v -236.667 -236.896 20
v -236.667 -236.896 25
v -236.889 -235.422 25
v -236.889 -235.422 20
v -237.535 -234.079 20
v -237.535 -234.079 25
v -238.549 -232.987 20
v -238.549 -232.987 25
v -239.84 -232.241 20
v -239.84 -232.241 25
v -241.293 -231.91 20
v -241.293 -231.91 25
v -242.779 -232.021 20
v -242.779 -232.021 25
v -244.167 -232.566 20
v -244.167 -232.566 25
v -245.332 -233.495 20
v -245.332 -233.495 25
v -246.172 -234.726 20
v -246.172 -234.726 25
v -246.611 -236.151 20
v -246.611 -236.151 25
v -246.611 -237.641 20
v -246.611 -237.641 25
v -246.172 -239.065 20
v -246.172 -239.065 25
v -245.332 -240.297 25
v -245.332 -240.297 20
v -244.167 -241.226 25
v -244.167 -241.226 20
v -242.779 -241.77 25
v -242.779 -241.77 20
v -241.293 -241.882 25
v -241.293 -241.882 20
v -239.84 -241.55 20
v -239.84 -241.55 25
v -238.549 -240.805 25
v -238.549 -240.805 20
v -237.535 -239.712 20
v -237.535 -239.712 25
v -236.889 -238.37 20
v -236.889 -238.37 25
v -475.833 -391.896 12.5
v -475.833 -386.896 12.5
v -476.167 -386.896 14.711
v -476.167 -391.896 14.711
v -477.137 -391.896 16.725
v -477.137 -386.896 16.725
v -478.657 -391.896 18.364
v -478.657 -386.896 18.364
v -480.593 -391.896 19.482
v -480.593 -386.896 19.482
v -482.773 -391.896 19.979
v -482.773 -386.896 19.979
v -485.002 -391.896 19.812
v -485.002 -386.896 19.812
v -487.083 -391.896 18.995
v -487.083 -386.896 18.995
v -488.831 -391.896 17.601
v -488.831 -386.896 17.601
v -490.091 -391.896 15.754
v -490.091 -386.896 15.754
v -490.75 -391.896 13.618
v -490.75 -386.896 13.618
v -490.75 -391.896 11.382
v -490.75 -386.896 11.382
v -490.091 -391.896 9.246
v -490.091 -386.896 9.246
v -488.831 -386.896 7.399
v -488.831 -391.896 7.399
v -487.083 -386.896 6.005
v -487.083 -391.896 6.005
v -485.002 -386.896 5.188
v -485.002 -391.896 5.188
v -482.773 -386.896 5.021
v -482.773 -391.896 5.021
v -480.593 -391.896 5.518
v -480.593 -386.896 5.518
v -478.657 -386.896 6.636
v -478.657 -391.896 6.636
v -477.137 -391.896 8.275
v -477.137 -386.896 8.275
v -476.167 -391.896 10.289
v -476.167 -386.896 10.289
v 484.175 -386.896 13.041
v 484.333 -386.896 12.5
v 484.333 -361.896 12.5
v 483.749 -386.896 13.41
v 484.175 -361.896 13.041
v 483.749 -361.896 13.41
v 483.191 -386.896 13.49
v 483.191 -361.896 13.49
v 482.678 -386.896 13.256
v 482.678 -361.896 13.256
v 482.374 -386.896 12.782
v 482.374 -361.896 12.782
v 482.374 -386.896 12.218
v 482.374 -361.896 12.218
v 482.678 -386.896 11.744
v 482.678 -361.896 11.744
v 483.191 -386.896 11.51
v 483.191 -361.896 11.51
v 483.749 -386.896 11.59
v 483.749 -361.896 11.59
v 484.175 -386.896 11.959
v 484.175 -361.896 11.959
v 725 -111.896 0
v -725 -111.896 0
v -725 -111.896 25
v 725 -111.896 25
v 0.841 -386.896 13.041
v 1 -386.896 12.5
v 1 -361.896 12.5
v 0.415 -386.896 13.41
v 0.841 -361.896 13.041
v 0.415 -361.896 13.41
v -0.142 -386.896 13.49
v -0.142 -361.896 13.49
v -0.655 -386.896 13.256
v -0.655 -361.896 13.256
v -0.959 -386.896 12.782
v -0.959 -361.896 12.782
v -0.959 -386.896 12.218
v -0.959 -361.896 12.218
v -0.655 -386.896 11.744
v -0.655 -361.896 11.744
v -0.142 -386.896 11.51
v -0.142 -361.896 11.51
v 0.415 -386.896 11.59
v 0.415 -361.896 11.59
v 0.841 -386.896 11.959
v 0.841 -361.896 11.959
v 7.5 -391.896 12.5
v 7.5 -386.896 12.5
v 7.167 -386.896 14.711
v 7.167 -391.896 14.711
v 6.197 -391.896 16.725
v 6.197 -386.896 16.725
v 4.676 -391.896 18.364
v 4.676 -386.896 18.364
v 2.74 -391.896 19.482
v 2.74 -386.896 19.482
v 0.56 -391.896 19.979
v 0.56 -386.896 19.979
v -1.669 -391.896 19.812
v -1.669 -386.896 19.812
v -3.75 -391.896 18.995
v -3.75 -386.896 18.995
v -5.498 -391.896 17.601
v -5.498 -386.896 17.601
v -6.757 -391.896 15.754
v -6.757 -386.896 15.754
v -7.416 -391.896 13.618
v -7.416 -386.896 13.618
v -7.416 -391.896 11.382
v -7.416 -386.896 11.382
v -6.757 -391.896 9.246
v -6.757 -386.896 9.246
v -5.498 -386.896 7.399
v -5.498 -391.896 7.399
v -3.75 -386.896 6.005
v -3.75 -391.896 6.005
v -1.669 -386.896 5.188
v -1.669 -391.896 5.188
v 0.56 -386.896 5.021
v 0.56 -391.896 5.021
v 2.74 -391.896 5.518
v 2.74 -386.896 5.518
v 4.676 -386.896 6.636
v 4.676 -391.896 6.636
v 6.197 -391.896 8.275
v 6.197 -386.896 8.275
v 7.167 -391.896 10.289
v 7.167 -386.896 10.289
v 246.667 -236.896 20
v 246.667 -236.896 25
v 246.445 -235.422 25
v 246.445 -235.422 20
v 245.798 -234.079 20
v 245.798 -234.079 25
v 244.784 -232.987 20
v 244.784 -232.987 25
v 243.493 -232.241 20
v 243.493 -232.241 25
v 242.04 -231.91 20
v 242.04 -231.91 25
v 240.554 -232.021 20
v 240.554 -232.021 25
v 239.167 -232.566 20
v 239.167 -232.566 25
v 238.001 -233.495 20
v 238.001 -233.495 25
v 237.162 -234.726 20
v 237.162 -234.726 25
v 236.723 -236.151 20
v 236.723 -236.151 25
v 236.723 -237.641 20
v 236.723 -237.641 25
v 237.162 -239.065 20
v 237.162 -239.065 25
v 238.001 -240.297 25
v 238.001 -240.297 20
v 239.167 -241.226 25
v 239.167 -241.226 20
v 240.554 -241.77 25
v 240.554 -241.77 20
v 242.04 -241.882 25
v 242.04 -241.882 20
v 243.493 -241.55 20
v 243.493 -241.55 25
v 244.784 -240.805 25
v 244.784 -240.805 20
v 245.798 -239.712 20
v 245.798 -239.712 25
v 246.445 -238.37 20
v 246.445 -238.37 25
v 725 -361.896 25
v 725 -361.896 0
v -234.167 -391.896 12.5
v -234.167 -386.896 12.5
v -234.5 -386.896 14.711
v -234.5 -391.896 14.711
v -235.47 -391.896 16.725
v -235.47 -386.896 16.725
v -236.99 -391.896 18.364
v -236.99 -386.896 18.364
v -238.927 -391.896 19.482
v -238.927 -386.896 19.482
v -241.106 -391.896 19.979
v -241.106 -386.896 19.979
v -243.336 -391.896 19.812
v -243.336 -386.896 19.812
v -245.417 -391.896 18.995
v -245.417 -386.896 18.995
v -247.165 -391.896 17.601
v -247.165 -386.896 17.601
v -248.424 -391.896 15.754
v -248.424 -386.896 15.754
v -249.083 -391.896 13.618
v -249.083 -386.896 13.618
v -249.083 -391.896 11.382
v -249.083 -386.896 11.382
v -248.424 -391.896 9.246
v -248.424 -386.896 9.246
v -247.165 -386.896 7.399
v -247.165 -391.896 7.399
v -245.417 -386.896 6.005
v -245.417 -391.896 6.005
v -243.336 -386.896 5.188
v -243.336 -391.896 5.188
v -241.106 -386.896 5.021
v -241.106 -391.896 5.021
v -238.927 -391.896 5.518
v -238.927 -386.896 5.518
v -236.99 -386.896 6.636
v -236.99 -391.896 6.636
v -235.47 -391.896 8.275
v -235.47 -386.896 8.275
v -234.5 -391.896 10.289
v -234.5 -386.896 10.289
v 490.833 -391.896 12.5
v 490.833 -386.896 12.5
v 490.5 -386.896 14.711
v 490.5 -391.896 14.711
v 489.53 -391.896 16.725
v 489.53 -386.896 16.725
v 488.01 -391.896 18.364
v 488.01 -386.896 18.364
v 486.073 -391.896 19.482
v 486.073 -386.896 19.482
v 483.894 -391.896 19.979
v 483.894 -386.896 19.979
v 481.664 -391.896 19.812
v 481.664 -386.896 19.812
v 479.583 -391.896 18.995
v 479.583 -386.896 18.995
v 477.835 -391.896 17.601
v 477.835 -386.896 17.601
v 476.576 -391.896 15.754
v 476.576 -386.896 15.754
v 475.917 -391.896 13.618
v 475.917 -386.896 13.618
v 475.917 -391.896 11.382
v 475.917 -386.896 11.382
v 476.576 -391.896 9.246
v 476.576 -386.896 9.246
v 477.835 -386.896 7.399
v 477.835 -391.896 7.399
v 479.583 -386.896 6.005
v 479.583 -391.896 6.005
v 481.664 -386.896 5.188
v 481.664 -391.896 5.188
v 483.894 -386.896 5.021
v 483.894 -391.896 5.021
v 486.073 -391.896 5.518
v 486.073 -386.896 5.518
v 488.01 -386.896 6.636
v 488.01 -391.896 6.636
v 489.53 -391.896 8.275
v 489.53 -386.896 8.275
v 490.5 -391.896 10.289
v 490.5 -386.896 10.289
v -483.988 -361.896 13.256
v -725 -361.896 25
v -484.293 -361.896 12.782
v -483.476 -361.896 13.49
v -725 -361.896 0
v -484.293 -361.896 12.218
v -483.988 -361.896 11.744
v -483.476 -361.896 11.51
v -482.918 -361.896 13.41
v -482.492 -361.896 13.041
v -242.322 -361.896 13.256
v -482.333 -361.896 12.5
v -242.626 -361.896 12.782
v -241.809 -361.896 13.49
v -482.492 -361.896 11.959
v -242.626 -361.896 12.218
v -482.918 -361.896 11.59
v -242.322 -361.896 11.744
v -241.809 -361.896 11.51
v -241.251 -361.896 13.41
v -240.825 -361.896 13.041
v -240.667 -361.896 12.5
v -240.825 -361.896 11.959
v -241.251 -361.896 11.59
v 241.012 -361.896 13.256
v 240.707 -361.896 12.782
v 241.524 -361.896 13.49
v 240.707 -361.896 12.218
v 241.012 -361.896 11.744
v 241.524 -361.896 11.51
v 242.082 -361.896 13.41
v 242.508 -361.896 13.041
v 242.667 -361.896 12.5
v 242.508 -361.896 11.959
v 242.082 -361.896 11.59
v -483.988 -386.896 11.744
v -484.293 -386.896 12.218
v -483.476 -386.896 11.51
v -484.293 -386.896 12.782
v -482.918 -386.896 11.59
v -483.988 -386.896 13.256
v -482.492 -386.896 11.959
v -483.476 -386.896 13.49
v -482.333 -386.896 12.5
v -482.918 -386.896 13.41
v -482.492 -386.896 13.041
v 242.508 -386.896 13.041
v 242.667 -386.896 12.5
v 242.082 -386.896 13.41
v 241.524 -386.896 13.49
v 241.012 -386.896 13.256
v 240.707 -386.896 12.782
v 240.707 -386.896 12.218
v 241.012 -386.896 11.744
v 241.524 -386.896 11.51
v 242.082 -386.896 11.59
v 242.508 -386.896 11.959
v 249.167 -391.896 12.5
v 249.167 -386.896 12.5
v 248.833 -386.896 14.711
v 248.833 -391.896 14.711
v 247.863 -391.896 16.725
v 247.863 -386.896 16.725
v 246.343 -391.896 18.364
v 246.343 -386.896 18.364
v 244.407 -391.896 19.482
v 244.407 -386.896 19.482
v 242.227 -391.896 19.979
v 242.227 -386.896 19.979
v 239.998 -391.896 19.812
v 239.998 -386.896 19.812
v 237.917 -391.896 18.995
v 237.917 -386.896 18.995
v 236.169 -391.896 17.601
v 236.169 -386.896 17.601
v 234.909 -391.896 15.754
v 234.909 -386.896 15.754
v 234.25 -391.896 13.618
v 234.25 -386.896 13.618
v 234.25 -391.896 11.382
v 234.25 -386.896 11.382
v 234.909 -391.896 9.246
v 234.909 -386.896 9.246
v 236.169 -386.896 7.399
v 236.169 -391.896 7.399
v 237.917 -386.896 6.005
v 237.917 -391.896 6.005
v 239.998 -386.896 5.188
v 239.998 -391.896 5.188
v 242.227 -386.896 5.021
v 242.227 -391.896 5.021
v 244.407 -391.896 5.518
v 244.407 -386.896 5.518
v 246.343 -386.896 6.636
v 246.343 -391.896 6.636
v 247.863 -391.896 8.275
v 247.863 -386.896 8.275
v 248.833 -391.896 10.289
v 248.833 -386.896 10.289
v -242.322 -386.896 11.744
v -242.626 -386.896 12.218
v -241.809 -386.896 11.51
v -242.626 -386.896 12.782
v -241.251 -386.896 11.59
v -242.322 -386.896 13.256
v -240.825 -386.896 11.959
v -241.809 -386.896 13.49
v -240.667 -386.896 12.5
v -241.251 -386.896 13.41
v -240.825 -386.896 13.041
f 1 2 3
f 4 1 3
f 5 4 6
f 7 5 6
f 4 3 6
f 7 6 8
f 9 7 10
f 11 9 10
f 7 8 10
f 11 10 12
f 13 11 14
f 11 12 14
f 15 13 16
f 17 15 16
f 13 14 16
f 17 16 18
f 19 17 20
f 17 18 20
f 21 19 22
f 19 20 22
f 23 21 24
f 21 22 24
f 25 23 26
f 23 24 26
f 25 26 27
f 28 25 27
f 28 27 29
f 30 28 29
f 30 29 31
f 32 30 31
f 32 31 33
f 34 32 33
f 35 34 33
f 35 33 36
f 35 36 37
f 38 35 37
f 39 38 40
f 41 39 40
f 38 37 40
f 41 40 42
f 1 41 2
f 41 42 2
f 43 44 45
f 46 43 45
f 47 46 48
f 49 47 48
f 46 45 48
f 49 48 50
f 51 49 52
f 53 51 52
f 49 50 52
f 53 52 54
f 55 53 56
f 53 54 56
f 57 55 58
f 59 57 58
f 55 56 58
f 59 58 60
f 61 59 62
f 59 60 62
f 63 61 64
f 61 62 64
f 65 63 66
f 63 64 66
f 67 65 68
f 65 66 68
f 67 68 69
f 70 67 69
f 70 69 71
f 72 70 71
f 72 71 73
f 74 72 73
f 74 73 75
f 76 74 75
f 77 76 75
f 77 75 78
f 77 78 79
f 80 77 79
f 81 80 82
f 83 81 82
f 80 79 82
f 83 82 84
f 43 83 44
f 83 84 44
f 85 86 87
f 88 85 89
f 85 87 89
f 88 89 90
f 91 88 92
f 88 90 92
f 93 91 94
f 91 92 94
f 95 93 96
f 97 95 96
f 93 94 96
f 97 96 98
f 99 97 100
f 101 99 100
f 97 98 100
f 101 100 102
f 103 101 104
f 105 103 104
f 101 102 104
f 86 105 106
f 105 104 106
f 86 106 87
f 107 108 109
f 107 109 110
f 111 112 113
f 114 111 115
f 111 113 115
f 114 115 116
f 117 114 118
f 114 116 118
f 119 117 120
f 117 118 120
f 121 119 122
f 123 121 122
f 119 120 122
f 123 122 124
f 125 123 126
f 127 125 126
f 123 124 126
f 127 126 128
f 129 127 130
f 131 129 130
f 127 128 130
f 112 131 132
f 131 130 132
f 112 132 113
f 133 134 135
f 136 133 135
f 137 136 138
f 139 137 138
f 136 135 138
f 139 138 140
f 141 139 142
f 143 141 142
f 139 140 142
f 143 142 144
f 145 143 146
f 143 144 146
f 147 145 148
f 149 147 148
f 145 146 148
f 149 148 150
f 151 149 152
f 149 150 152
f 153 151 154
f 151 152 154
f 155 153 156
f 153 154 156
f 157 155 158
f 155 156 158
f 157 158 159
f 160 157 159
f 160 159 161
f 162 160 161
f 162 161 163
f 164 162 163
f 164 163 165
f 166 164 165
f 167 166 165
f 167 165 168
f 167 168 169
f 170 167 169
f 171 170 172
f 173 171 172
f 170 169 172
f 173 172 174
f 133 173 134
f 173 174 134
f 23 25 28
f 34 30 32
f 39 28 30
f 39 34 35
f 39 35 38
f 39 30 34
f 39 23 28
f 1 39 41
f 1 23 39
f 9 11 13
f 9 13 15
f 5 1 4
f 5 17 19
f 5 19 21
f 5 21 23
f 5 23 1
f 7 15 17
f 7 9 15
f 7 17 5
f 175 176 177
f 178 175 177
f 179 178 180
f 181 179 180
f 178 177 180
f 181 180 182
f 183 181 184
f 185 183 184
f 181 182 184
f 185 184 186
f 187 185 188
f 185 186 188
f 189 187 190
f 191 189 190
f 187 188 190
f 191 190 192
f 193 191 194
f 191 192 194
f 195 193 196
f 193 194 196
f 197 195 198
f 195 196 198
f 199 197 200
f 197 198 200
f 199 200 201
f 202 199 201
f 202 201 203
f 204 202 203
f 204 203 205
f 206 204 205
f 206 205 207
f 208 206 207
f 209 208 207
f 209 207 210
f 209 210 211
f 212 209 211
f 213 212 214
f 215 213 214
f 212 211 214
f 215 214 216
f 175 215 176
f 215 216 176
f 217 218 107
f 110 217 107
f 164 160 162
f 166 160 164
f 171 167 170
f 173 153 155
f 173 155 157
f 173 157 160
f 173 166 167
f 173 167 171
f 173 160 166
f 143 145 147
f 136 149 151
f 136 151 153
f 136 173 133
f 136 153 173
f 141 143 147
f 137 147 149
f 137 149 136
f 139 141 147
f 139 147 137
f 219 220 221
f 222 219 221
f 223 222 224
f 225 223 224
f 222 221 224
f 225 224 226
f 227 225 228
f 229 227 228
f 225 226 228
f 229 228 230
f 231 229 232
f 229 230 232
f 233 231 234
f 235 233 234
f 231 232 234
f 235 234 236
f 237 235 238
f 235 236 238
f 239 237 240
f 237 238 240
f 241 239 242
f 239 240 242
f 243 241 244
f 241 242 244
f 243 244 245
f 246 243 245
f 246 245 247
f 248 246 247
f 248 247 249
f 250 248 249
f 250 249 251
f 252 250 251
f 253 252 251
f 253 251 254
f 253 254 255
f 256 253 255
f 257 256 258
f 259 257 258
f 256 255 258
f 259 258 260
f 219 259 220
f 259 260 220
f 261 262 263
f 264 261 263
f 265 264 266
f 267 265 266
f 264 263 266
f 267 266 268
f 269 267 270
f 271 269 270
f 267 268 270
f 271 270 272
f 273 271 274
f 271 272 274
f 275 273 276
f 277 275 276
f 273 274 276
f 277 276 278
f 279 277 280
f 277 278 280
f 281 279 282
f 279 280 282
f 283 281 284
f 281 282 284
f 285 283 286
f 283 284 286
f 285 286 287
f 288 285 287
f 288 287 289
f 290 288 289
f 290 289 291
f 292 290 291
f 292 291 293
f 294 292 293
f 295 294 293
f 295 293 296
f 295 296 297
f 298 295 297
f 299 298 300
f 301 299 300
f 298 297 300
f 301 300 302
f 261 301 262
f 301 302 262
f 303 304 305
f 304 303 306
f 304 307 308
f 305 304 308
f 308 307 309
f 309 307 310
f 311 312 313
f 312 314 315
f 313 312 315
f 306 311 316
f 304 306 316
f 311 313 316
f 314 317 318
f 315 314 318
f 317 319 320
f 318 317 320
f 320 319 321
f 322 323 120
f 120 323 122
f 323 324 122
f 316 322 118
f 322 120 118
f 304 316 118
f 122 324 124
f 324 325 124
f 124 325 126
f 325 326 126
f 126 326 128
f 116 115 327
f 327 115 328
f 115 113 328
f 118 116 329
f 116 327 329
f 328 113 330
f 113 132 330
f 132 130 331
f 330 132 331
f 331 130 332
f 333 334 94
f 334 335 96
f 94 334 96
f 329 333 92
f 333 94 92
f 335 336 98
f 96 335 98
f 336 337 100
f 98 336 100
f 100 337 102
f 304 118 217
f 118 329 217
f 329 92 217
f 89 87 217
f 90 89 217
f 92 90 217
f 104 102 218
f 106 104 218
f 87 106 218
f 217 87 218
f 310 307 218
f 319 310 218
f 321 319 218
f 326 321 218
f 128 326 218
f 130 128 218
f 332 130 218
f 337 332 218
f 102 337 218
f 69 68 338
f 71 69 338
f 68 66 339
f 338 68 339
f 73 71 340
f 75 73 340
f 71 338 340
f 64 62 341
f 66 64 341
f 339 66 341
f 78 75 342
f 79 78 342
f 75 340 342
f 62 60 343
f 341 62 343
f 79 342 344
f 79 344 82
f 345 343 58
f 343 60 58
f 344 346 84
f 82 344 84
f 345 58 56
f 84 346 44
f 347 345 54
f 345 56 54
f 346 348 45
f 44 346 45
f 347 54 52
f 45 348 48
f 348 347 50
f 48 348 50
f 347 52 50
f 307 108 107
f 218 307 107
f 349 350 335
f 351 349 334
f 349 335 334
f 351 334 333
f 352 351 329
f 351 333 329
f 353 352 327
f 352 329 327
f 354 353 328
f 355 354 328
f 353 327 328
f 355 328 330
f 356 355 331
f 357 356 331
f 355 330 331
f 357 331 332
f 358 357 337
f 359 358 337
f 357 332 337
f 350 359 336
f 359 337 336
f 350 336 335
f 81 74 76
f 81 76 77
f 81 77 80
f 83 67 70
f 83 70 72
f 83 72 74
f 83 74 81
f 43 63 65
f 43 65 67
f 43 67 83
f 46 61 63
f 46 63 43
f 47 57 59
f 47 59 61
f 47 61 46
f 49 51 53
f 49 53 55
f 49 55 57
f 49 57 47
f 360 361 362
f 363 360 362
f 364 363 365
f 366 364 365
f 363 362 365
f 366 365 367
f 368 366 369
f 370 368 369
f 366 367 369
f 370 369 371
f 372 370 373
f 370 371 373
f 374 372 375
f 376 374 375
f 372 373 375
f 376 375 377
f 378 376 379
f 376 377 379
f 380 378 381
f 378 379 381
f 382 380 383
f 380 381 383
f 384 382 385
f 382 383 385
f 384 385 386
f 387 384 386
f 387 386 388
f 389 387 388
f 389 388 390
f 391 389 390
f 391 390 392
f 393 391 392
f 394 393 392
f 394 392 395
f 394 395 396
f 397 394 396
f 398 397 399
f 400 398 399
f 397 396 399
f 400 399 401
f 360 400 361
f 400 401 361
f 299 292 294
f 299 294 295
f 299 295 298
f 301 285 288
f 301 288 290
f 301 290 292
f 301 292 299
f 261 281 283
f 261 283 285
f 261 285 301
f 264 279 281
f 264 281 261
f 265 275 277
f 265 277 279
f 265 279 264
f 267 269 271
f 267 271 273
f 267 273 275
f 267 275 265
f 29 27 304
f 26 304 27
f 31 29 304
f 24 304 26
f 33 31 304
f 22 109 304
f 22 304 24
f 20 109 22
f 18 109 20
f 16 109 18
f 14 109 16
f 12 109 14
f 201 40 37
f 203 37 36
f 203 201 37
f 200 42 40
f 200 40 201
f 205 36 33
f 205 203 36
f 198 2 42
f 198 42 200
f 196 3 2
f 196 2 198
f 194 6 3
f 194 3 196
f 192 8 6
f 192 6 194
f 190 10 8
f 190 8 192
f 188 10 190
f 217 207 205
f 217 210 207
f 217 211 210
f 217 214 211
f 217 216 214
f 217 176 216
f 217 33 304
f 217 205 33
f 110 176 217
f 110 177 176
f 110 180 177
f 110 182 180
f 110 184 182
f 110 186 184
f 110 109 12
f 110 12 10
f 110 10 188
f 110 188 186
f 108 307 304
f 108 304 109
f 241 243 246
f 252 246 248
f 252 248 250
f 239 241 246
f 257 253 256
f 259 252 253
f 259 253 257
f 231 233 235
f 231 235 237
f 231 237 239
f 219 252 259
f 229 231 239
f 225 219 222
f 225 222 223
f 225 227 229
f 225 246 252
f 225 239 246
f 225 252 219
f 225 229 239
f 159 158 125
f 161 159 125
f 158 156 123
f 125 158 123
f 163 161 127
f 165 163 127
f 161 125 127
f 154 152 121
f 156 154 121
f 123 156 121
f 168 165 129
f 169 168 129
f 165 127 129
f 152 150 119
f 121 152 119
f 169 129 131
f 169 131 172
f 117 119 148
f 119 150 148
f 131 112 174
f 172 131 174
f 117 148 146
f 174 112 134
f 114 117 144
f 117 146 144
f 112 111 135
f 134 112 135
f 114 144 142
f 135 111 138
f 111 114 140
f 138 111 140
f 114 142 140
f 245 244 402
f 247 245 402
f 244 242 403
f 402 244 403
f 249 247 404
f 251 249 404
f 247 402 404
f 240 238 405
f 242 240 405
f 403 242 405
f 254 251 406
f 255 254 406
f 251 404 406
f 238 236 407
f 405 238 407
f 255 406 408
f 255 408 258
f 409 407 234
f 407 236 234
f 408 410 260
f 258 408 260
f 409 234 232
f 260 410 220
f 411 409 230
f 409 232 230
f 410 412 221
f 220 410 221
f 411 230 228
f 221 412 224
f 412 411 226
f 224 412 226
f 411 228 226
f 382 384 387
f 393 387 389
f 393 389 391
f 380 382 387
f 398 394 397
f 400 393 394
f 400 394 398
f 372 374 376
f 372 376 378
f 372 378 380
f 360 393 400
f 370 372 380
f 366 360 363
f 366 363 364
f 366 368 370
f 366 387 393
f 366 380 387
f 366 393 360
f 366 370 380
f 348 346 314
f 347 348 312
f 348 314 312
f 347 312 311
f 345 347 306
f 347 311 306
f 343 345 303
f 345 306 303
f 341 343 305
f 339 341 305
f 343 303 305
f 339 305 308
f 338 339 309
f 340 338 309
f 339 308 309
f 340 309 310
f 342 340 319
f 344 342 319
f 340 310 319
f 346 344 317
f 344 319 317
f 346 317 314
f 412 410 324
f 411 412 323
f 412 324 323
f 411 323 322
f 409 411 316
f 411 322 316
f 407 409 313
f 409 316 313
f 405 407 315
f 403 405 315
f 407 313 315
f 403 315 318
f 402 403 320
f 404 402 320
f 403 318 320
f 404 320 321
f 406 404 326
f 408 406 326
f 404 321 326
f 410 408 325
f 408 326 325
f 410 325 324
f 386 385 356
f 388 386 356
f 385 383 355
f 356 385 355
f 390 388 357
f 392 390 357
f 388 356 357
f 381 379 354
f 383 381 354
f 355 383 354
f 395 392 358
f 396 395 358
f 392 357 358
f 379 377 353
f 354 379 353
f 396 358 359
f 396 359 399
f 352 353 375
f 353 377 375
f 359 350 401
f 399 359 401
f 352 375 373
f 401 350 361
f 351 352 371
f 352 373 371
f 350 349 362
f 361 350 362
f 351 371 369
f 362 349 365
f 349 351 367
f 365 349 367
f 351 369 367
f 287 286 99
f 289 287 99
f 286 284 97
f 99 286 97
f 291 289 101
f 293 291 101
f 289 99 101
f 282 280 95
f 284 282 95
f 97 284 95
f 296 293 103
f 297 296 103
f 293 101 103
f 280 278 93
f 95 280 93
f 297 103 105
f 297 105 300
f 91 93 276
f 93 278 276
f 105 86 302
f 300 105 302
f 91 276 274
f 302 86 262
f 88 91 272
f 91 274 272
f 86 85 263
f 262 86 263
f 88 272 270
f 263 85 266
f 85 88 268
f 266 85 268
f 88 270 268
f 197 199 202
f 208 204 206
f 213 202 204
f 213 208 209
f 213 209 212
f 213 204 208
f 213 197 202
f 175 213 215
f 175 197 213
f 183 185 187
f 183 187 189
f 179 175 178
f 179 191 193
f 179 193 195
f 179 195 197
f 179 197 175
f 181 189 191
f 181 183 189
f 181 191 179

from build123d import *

# Parameters (mm, degrees)
F0_W     = 1450
F0_H     = 250
F1_DEPTH = 25
F2_R     = 1
F3_DEPTH = 25
F5_R     = 7.5
F6_DEPTH = 5
F7_R     = 5
F8_DEPTH = 5


with BuildPart() as f1:
    # F0 (on Top) → F1 (new body)
    with BuildSketch(Plane.XY):
        with Locations((0, -236.8958477461)):
            Rectangle(F0_W, F0_H)
    extrude(amount=F1_DEPTH)

    # F2 (on face) → F3 (join)
    with BuildSketch(Plane.XZ.offset(361.8958477461)):
        with Locations((-483.3333333333, 12.5)):
            Circle(F2_R)
        with Locations((-241.6666666667, 12.5)):
            Circle(F2_R)
        with Locations((0, 12.5)):
            Circle(F2_R)
        with Locations((241.6666666667, 12.5)):
            Circle(F2_R)
        with Locations((483.3333333333, 12.5)):
            Circle(F2_R)
    extrude(amount=F3_DEPTH)

    # F5 (on offset) → F6 (join)
    with BuildSketch(Plane.XZ.offset(386.8958477461)):
        with Locations((-483.3333333333, 12.5)):
            Circle(F5_R)
        with Locations((-241.6666666667, 12.5)):
            Circle(F5_R)
        with Locations((0, 12.5)):
            Circle(F5_R)
        with Locations((241.6666666667, 12.5)):
            Circle(F5_R)
        with Locations((483.3333333333, 12.5)):
            Circle(F5_R)
    extrude(amount=F6_DEPTH)

    # F7 (on face) → F8 (cut)
    with BuildSketch(Plane.XY.offset(25)):
        with Locations((-241.6666666667, -236.8958477461)):
            Circle(F7_R)
        with Locations((241.6666666667, -236.8958477461)):
            Circle(F7_R)
    extrude(amount=-F8_DEPTH, mode=Mode.SUBTRACT)


solid = f1.part
